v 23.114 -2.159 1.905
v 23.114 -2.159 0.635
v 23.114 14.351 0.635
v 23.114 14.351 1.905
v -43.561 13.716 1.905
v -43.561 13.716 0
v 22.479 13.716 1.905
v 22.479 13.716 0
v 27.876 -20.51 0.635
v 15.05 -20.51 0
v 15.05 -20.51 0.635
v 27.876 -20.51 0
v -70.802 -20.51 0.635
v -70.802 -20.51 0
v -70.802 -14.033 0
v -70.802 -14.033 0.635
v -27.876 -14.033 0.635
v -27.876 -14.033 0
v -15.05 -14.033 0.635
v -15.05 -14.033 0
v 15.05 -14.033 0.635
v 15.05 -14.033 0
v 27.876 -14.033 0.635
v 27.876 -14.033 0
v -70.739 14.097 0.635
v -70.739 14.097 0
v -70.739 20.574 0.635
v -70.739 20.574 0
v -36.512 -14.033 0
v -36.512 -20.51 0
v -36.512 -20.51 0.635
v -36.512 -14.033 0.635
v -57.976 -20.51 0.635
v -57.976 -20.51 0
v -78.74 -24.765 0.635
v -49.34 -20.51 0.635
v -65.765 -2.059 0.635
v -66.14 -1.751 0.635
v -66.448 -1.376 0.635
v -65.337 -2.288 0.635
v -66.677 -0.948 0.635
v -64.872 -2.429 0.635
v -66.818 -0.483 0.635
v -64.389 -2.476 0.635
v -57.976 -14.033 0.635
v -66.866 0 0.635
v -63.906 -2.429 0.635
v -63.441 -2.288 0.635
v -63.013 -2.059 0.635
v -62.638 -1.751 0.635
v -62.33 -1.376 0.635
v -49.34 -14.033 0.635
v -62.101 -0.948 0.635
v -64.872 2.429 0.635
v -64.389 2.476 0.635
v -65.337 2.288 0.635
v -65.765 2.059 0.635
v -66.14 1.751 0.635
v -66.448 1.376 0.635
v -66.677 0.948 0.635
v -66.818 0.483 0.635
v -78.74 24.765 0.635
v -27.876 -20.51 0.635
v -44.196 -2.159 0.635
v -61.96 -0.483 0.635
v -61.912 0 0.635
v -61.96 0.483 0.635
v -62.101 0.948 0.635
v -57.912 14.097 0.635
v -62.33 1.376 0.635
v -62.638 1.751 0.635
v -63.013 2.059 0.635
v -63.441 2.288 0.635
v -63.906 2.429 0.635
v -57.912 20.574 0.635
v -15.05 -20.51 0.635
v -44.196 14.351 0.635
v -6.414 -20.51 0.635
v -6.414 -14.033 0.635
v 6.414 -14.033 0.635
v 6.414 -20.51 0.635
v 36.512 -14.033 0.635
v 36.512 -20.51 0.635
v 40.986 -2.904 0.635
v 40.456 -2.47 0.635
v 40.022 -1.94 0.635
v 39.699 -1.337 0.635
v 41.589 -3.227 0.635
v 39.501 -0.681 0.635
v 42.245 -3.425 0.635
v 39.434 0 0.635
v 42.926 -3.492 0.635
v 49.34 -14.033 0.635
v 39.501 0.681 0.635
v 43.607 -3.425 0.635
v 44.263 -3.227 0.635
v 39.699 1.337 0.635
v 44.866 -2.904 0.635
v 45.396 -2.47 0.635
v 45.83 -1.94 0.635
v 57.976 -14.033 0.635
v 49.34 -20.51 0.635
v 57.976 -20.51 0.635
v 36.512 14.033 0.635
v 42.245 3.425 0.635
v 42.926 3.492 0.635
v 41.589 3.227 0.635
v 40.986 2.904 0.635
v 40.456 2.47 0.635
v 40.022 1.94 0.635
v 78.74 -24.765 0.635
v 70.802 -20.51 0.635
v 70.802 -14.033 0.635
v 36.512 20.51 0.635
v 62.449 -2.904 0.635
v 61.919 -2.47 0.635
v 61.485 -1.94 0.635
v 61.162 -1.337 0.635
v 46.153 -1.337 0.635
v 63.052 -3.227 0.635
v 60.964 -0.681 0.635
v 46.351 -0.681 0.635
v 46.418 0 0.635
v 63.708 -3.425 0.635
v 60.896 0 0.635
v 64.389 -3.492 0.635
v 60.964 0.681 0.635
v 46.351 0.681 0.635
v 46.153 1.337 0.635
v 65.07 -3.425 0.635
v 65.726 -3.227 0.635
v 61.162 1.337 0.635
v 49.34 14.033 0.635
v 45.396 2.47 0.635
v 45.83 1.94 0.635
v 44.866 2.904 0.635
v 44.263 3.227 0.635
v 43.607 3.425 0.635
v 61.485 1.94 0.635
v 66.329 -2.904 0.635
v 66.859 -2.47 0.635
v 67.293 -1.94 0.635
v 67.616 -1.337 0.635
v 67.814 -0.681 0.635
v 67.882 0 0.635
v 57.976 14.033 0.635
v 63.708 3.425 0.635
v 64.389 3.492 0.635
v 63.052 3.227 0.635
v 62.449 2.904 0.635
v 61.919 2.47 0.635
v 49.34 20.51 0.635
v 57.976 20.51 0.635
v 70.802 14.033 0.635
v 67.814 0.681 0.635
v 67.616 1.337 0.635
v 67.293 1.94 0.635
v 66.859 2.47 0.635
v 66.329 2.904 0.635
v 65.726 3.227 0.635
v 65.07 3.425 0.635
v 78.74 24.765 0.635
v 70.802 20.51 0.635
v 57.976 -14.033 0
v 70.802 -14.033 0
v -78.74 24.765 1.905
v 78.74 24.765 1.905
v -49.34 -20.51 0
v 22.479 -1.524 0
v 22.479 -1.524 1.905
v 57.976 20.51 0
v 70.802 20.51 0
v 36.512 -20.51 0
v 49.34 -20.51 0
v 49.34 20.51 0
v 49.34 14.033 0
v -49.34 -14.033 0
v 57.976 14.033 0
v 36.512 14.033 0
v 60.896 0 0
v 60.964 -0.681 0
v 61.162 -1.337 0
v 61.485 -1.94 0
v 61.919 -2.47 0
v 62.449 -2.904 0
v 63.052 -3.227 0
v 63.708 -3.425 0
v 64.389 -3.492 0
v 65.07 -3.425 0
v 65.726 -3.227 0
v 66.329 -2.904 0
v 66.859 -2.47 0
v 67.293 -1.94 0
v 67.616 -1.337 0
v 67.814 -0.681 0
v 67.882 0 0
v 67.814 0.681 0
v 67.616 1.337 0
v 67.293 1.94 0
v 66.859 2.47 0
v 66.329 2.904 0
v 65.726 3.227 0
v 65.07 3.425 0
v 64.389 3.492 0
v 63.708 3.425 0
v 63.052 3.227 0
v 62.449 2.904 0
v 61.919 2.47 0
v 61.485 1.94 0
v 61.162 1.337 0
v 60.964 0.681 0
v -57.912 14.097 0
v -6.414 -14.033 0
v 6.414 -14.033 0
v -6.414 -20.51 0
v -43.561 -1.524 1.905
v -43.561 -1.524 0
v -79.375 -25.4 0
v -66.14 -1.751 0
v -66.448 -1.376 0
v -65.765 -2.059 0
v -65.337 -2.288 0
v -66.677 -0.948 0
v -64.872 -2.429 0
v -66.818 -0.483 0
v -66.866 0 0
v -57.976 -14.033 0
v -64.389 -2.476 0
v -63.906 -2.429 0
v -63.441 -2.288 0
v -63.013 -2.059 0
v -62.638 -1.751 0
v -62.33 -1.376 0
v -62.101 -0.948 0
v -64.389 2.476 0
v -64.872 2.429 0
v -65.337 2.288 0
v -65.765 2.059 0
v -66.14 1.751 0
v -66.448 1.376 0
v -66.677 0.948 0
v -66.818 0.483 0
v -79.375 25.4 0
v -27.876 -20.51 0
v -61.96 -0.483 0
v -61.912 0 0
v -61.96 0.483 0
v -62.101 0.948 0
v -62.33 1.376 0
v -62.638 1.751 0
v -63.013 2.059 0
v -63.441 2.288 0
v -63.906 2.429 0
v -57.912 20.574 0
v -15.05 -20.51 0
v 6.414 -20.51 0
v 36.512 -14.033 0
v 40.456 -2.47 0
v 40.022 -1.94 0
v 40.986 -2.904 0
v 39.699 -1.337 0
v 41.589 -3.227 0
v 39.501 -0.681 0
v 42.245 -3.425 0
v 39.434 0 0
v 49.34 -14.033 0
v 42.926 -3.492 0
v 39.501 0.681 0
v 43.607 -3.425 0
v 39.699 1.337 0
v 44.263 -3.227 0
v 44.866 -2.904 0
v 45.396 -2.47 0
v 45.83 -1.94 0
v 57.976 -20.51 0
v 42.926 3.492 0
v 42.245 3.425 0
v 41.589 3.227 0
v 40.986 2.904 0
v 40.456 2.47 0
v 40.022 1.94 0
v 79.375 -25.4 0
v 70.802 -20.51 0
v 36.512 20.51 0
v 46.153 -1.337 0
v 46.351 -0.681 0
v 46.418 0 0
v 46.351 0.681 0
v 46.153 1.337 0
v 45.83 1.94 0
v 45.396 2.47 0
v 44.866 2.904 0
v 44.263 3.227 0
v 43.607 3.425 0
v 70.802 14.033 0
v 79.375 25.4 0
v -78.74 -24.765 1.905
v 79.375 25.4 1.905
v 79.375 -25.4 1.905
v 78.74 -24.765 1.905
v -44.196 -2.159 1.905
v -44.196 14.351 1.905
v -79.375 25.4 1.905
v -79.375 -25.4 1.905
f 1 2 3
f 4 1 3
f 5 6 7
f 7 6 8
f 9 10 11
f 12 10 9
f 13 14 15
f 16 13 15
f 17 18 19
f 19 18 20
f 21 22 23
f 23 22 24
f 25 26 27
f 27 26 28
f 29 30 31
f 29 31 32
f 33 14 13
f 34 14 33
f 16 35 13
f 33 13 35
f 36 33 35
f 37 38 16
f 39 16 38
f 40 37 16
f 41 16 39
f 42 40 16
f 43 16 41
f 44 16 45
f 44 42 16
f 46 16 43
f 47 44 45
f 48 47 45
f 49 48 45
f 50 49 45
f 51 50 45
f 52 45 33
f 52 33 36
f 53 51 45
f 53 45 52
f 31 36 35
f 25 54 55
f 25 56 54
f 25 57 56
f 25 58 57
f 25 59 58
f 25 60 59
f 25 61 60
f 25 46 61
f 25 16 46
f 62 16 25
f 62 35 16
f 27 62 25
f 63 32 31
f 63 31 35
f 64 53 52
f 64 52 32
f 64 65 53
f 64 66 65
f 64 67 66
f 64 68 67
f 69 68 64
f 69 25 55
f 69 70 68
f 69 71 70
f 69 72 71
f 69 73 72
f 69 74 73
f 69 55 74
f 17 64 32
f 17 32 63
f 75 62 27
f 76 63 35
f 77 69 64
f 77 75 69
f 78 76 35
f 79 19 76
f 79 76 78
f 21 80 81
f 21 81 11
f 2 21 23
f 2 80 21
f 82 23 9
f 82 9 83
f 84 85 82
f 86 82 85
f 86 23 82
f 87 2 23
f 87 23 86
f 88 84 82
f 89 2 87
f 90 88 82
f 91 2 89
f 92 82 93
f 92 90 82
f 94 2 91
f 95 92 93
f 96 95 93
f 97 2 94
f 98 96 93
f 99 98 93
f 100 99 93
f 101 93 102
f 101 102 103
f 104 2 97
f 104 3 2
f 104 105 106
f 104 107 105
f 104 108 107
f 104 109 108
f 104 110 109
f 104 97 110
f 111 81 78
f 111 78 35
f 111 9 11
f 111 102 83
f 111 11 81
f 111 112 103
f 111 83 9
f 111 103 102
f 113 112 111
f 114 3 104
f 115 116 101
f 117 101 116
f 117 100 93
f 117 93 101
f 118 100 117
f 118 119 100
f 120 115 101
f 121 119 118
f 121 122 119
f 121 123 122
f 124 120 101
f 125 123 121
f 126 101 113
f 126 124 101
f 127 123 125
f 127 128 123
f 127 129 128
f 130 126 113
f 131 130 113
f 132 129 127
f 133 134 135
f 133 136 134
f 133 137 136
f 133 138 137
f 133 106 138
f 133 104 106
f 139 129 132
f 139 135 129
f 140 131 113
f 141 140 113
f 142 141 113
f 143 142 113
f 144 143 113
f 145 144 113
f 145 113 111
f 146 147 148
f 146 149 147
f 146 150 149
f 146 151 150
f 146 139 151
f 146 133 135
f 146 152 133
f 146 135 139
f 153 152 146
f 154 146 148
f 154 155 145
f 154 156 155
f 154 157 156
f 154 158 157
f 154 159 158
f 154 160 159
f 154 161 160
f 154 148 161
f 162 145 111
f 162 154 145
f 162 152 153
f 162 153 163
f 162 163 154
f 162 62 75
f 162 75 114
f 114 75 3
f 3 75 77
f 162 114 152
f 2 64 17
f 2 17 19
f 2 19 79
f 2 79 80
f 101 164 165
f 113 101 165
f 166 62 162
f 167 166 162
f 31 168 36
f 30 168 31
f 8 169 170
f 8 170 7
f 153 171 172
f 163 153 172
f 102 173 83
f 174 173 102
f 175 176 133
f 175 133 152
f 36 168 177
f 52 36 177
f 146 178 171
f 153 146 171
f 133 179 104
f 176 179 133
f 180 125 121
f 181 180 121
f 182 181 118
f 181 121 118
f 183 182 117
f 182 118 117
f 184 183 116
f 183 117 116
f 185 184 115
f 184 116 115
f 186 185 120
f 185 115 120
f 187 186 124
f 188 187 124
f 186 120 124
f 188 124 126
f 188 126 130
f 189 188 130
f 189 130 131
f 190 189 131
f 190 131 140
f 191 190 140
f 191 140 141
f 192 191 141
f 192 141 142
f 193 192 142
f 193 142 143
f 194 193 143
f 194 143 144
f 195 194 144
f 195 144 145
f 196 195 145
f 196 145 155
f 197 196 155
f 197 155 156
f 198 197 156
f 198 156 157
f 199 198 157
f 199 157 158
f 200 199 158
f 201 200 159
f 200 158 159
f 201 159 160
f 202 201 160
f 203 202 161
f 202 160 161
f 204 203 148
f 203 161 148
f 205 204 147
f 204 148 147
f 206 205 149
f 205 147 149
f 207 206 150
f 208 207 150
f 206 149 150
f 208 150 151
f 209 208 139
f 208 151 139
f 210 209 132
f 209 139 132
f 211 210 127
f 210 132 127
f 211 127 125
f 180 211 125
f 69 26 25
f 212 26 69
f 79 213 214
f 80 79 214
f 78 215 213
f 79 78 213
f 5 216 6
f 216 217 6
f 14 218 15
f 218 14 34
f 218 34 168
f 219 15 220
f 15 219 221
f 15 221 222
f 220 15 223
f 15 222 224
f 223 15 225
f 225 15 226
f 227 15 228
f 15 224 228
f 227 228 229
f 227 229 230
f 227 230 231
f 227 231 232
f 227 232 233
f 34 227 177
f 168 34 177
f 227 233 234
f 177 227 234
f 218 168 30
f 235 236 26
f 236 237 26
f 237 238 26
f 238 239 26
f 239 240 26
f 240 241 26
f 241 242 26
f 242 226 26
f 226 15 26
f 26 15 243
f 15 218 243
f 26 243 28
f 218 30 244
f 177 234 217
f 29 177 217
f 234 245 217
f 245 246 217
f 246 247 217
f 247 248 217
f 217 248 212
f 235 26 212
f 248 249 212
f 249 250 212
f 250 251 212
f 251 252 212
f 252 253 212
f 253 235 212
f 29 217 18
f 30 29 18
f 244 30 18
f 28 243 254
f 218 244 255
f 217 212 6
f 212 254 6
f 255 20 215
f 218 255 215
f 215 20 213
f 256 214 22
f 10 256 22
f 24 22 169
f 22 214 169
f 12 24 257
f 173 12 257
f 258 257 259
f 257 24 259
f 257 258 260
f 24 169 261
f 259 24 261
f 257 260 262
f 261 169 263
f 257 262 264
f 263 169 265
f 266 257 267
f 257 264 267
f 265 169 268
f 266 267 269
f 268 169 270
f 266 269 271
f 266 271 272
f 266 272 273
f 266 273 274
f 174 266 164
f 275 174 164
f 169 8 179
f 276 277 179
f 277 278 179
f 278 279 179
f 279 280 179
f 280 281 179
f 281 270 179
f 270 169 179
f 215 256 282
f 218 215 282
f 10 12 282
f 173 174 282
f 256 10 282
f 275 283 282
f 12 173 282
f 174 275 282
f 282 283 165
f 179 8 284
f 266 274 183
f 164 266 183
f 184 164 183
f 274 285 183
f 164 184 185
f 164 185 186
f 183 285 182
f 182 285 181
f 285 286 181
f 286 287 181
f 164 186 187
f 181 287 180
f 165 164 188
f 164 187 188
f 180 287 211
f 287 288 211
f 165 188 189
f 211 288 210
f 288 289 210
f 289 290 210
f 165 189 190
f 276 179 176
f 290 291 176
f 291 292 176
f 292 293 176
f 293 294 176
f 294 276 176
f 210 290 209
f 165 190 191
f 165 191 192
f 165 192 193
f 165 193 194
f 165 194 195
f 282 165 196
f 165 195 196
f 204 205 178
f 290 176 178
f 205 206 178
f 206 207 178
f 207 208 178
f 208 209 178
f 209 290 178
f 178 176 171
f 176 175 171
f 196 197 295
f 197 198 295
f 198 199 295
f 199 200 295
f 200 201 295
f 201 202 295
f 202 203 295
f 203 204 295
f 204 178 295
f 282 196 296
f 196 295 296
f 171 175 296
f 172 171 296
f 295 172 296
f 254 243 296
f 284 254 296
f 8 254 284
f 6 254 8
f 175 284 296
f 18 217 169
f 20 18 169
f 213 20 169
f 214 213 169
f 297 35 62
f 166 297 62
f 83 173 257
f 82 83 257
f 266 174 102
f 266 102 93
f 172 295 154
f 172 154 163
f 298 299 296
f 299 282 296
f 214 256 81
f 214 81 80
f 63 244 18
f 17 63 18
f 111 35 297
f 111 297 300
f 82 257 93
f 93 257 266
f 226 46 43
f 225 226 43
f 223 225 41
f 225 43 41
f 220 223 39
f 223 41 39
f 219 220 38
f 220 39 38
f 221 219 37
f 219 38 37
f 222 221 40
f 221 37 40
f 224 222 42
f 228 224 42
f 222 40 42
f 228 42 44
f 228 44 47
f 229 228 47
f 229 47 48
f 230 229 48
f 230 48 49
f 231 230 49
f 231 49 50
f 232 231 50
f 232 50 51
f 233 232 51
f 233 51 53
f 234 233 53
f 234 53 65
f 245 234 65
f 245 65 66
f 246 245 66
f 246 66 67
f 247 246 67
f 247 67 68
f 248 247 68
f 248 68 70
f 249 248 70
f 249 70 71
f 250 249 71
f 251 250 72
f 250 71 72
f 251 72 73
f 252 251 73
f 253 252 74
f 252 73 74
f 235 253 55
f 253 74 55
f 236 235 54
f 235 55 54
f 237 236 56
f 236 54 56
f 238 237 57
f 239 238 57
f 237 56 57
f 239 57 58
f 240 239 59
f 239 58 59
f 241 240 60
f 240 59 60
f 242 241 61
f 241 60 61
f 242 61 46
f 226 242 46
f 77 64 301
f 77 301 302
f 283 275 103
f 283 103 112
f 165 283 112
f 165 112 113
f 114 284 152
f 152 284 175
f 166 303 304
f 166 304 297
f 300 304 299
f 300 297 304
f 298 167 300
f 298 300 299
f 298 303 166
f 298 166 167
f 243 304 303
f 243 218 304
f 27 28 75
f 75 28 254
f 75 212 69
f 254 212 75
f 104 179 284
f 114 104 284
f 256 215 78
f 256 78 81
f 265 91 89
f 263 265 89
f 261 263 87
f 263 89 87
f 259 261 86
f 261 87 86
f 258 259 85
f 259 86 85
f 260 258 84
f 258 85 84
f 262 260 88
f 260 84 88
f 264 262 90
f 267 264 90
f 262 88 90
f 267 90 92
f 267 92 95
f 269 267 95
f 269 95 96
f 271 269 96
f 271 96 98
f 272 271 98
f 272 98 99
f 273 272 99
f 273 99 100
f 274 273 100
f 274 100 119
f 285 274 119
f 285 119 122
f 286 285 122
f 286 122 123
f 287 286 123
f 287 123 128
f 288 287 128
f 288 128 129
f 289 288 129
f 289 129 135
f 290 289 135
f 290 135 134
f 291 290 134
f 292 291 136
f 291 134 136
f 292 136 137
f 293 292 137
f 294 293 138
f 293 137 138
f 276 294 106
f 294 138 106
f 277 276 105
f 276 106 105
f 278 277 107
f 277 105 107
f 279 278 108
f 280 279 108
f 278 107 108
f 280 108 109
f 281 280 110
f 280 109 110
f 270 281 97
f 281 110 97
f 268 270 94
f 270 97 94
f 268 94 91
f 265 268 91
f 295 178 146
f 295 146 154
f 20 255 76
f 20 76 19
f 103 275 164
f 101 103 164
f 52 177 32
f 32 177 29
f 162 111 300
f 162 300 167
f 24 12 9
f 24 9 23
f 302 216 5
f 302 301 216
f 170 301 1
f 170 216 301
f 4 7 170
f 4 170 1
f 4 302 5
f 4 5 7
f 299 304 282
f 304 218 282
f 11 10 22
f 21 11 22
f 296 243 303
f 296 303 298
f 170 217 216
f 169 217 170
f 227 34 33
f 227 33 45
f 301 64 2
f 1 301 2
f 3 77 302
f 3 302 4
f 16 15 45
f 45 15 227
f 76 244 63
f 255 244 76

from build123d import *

# Parameters (mm, degrees)
F0_W     = 158.75
F0_H     = 50.8
F0_W_2   = 12.827
F0_H_2   = 6.477
F0_W_3   = 66.04
F0_H_3   = 15.24
F1_DEPTH = 0.635
F2_D     = 6.985
F3_D     = 6.985
F5_W     = 158.75
F5_H     = 50.8
F5_W_2   = 157.48
F5_H_2   = 49.53
F6_DEPTH = 1.27
F7_W     = 67.31
F7_H     = 16.51
F7_W_2   = 66.04
F7_H_2   = 15.24
F8_DEPTH = 1.27
F9_D     = 4.953


with BuildPart() as f1:
    # F0 (on Top) → F1 (new body)
    with BuildSketch(Plane.XY):
        Rectangle(F0_W, F0_H)
        with Locations((-64.389, -17.272)):
            Rectangle(F0_W_2, F0_H_2, mode=Mode.SUBTRACT)
        with Locations((-42.926, -17.272)):
            Rectangle(F0_W_2, F0_H_2, mode=Mode.SUBTRACT)
        with Locations((-21.463, -17.272)):
            Rectangle(F0_W_2, F0_H_2, mode=Mode.SUBTRACT)
        with Locations((0, -17.272)):
            Rectangle(F0_W_2, F0_H_2, mode=Mode.SUBTRACT)
        with Locations((21.463, -17.272)):
            Rectangle(F0_W_2, F0_H_2, mode=Mode.SUBTRACT)
        with Locations((42.926, -17.272)):
            Rectangle(F0_W_2, F0_H_2, mode=Mode.SUBTRACT)
        with Locations((64.389, -17.272)):
            Rectangle(F0_W_2, F0_H_2, mode=Mode.SUBTRACT)
        with Locations((-10.541, 6.096)):
            Rectangle(F0_W_3, F0_H_3, mode=Mode.SUBTRACT)
        with Locations((-64.3255, 17.3355)):
            Rectangle(F0_W_2, F0_H_2, mode=Mode.SUBTRACT)
        with Locations((42.926, 17.272)):
            Rectangle(F0_W_2, F0_H_2, mode=Mode.SUBTRACT)
        with Locations((64.389, 17.272)):
            Rectangle(F0_W_2, F0_H_2, mode=Mode.SUBTRACT)
    extrude(amount=F1_DEPTH)

    # F2 (through all)
    with Locations(Plane(origin=(0, 0, 0), x_dir=(1, 0, 0), z_dir=(0, 0, -1))):
        with Locations((42.926, 0)):
            Hole(F2_D / 2)

    # F3 (through all)
    with Locations(Plane(origin=(0, 0, 0), x_dir=(1, 0, 0), z_dir=(0, 0, -1))):
        with Locations((64.389, 0)):
            Hole(F3_D / 2)

    # F5 (on offset) → F6 (join)
    with BuildSketch(Plane.XY.offset(0.635)):
        Rectangle(F5_W, F5_H)
        Rectangle(F5_W_2, F5_H_2, mode=Mode.SUBTRACT)
    extrude(amount=F6_DEPTH)

    # F7 (on offset) → F8 (join)
    with BuildSketch(Plane.XY.offset(0.635)):
        with Locations((-10.541, 6.096)):
            Rectangle(F7_W, F7_H)
        with Locations((-10.541, 6.096)):
            Rectangle(F7_W_2, F7_H_2, mode=Mode.SUBTRACT)
    extrude(amount=F8_DEPTH)

    # F9 (through all)
    with Locations(Plane(origin=(0, 0, 0), x_dir=(1, 0, 0), z_dir=(0, 0, -1))):
        with Locations((-64.389, 0)):
            Hole(F9_D / 2)


solid = f1.part
